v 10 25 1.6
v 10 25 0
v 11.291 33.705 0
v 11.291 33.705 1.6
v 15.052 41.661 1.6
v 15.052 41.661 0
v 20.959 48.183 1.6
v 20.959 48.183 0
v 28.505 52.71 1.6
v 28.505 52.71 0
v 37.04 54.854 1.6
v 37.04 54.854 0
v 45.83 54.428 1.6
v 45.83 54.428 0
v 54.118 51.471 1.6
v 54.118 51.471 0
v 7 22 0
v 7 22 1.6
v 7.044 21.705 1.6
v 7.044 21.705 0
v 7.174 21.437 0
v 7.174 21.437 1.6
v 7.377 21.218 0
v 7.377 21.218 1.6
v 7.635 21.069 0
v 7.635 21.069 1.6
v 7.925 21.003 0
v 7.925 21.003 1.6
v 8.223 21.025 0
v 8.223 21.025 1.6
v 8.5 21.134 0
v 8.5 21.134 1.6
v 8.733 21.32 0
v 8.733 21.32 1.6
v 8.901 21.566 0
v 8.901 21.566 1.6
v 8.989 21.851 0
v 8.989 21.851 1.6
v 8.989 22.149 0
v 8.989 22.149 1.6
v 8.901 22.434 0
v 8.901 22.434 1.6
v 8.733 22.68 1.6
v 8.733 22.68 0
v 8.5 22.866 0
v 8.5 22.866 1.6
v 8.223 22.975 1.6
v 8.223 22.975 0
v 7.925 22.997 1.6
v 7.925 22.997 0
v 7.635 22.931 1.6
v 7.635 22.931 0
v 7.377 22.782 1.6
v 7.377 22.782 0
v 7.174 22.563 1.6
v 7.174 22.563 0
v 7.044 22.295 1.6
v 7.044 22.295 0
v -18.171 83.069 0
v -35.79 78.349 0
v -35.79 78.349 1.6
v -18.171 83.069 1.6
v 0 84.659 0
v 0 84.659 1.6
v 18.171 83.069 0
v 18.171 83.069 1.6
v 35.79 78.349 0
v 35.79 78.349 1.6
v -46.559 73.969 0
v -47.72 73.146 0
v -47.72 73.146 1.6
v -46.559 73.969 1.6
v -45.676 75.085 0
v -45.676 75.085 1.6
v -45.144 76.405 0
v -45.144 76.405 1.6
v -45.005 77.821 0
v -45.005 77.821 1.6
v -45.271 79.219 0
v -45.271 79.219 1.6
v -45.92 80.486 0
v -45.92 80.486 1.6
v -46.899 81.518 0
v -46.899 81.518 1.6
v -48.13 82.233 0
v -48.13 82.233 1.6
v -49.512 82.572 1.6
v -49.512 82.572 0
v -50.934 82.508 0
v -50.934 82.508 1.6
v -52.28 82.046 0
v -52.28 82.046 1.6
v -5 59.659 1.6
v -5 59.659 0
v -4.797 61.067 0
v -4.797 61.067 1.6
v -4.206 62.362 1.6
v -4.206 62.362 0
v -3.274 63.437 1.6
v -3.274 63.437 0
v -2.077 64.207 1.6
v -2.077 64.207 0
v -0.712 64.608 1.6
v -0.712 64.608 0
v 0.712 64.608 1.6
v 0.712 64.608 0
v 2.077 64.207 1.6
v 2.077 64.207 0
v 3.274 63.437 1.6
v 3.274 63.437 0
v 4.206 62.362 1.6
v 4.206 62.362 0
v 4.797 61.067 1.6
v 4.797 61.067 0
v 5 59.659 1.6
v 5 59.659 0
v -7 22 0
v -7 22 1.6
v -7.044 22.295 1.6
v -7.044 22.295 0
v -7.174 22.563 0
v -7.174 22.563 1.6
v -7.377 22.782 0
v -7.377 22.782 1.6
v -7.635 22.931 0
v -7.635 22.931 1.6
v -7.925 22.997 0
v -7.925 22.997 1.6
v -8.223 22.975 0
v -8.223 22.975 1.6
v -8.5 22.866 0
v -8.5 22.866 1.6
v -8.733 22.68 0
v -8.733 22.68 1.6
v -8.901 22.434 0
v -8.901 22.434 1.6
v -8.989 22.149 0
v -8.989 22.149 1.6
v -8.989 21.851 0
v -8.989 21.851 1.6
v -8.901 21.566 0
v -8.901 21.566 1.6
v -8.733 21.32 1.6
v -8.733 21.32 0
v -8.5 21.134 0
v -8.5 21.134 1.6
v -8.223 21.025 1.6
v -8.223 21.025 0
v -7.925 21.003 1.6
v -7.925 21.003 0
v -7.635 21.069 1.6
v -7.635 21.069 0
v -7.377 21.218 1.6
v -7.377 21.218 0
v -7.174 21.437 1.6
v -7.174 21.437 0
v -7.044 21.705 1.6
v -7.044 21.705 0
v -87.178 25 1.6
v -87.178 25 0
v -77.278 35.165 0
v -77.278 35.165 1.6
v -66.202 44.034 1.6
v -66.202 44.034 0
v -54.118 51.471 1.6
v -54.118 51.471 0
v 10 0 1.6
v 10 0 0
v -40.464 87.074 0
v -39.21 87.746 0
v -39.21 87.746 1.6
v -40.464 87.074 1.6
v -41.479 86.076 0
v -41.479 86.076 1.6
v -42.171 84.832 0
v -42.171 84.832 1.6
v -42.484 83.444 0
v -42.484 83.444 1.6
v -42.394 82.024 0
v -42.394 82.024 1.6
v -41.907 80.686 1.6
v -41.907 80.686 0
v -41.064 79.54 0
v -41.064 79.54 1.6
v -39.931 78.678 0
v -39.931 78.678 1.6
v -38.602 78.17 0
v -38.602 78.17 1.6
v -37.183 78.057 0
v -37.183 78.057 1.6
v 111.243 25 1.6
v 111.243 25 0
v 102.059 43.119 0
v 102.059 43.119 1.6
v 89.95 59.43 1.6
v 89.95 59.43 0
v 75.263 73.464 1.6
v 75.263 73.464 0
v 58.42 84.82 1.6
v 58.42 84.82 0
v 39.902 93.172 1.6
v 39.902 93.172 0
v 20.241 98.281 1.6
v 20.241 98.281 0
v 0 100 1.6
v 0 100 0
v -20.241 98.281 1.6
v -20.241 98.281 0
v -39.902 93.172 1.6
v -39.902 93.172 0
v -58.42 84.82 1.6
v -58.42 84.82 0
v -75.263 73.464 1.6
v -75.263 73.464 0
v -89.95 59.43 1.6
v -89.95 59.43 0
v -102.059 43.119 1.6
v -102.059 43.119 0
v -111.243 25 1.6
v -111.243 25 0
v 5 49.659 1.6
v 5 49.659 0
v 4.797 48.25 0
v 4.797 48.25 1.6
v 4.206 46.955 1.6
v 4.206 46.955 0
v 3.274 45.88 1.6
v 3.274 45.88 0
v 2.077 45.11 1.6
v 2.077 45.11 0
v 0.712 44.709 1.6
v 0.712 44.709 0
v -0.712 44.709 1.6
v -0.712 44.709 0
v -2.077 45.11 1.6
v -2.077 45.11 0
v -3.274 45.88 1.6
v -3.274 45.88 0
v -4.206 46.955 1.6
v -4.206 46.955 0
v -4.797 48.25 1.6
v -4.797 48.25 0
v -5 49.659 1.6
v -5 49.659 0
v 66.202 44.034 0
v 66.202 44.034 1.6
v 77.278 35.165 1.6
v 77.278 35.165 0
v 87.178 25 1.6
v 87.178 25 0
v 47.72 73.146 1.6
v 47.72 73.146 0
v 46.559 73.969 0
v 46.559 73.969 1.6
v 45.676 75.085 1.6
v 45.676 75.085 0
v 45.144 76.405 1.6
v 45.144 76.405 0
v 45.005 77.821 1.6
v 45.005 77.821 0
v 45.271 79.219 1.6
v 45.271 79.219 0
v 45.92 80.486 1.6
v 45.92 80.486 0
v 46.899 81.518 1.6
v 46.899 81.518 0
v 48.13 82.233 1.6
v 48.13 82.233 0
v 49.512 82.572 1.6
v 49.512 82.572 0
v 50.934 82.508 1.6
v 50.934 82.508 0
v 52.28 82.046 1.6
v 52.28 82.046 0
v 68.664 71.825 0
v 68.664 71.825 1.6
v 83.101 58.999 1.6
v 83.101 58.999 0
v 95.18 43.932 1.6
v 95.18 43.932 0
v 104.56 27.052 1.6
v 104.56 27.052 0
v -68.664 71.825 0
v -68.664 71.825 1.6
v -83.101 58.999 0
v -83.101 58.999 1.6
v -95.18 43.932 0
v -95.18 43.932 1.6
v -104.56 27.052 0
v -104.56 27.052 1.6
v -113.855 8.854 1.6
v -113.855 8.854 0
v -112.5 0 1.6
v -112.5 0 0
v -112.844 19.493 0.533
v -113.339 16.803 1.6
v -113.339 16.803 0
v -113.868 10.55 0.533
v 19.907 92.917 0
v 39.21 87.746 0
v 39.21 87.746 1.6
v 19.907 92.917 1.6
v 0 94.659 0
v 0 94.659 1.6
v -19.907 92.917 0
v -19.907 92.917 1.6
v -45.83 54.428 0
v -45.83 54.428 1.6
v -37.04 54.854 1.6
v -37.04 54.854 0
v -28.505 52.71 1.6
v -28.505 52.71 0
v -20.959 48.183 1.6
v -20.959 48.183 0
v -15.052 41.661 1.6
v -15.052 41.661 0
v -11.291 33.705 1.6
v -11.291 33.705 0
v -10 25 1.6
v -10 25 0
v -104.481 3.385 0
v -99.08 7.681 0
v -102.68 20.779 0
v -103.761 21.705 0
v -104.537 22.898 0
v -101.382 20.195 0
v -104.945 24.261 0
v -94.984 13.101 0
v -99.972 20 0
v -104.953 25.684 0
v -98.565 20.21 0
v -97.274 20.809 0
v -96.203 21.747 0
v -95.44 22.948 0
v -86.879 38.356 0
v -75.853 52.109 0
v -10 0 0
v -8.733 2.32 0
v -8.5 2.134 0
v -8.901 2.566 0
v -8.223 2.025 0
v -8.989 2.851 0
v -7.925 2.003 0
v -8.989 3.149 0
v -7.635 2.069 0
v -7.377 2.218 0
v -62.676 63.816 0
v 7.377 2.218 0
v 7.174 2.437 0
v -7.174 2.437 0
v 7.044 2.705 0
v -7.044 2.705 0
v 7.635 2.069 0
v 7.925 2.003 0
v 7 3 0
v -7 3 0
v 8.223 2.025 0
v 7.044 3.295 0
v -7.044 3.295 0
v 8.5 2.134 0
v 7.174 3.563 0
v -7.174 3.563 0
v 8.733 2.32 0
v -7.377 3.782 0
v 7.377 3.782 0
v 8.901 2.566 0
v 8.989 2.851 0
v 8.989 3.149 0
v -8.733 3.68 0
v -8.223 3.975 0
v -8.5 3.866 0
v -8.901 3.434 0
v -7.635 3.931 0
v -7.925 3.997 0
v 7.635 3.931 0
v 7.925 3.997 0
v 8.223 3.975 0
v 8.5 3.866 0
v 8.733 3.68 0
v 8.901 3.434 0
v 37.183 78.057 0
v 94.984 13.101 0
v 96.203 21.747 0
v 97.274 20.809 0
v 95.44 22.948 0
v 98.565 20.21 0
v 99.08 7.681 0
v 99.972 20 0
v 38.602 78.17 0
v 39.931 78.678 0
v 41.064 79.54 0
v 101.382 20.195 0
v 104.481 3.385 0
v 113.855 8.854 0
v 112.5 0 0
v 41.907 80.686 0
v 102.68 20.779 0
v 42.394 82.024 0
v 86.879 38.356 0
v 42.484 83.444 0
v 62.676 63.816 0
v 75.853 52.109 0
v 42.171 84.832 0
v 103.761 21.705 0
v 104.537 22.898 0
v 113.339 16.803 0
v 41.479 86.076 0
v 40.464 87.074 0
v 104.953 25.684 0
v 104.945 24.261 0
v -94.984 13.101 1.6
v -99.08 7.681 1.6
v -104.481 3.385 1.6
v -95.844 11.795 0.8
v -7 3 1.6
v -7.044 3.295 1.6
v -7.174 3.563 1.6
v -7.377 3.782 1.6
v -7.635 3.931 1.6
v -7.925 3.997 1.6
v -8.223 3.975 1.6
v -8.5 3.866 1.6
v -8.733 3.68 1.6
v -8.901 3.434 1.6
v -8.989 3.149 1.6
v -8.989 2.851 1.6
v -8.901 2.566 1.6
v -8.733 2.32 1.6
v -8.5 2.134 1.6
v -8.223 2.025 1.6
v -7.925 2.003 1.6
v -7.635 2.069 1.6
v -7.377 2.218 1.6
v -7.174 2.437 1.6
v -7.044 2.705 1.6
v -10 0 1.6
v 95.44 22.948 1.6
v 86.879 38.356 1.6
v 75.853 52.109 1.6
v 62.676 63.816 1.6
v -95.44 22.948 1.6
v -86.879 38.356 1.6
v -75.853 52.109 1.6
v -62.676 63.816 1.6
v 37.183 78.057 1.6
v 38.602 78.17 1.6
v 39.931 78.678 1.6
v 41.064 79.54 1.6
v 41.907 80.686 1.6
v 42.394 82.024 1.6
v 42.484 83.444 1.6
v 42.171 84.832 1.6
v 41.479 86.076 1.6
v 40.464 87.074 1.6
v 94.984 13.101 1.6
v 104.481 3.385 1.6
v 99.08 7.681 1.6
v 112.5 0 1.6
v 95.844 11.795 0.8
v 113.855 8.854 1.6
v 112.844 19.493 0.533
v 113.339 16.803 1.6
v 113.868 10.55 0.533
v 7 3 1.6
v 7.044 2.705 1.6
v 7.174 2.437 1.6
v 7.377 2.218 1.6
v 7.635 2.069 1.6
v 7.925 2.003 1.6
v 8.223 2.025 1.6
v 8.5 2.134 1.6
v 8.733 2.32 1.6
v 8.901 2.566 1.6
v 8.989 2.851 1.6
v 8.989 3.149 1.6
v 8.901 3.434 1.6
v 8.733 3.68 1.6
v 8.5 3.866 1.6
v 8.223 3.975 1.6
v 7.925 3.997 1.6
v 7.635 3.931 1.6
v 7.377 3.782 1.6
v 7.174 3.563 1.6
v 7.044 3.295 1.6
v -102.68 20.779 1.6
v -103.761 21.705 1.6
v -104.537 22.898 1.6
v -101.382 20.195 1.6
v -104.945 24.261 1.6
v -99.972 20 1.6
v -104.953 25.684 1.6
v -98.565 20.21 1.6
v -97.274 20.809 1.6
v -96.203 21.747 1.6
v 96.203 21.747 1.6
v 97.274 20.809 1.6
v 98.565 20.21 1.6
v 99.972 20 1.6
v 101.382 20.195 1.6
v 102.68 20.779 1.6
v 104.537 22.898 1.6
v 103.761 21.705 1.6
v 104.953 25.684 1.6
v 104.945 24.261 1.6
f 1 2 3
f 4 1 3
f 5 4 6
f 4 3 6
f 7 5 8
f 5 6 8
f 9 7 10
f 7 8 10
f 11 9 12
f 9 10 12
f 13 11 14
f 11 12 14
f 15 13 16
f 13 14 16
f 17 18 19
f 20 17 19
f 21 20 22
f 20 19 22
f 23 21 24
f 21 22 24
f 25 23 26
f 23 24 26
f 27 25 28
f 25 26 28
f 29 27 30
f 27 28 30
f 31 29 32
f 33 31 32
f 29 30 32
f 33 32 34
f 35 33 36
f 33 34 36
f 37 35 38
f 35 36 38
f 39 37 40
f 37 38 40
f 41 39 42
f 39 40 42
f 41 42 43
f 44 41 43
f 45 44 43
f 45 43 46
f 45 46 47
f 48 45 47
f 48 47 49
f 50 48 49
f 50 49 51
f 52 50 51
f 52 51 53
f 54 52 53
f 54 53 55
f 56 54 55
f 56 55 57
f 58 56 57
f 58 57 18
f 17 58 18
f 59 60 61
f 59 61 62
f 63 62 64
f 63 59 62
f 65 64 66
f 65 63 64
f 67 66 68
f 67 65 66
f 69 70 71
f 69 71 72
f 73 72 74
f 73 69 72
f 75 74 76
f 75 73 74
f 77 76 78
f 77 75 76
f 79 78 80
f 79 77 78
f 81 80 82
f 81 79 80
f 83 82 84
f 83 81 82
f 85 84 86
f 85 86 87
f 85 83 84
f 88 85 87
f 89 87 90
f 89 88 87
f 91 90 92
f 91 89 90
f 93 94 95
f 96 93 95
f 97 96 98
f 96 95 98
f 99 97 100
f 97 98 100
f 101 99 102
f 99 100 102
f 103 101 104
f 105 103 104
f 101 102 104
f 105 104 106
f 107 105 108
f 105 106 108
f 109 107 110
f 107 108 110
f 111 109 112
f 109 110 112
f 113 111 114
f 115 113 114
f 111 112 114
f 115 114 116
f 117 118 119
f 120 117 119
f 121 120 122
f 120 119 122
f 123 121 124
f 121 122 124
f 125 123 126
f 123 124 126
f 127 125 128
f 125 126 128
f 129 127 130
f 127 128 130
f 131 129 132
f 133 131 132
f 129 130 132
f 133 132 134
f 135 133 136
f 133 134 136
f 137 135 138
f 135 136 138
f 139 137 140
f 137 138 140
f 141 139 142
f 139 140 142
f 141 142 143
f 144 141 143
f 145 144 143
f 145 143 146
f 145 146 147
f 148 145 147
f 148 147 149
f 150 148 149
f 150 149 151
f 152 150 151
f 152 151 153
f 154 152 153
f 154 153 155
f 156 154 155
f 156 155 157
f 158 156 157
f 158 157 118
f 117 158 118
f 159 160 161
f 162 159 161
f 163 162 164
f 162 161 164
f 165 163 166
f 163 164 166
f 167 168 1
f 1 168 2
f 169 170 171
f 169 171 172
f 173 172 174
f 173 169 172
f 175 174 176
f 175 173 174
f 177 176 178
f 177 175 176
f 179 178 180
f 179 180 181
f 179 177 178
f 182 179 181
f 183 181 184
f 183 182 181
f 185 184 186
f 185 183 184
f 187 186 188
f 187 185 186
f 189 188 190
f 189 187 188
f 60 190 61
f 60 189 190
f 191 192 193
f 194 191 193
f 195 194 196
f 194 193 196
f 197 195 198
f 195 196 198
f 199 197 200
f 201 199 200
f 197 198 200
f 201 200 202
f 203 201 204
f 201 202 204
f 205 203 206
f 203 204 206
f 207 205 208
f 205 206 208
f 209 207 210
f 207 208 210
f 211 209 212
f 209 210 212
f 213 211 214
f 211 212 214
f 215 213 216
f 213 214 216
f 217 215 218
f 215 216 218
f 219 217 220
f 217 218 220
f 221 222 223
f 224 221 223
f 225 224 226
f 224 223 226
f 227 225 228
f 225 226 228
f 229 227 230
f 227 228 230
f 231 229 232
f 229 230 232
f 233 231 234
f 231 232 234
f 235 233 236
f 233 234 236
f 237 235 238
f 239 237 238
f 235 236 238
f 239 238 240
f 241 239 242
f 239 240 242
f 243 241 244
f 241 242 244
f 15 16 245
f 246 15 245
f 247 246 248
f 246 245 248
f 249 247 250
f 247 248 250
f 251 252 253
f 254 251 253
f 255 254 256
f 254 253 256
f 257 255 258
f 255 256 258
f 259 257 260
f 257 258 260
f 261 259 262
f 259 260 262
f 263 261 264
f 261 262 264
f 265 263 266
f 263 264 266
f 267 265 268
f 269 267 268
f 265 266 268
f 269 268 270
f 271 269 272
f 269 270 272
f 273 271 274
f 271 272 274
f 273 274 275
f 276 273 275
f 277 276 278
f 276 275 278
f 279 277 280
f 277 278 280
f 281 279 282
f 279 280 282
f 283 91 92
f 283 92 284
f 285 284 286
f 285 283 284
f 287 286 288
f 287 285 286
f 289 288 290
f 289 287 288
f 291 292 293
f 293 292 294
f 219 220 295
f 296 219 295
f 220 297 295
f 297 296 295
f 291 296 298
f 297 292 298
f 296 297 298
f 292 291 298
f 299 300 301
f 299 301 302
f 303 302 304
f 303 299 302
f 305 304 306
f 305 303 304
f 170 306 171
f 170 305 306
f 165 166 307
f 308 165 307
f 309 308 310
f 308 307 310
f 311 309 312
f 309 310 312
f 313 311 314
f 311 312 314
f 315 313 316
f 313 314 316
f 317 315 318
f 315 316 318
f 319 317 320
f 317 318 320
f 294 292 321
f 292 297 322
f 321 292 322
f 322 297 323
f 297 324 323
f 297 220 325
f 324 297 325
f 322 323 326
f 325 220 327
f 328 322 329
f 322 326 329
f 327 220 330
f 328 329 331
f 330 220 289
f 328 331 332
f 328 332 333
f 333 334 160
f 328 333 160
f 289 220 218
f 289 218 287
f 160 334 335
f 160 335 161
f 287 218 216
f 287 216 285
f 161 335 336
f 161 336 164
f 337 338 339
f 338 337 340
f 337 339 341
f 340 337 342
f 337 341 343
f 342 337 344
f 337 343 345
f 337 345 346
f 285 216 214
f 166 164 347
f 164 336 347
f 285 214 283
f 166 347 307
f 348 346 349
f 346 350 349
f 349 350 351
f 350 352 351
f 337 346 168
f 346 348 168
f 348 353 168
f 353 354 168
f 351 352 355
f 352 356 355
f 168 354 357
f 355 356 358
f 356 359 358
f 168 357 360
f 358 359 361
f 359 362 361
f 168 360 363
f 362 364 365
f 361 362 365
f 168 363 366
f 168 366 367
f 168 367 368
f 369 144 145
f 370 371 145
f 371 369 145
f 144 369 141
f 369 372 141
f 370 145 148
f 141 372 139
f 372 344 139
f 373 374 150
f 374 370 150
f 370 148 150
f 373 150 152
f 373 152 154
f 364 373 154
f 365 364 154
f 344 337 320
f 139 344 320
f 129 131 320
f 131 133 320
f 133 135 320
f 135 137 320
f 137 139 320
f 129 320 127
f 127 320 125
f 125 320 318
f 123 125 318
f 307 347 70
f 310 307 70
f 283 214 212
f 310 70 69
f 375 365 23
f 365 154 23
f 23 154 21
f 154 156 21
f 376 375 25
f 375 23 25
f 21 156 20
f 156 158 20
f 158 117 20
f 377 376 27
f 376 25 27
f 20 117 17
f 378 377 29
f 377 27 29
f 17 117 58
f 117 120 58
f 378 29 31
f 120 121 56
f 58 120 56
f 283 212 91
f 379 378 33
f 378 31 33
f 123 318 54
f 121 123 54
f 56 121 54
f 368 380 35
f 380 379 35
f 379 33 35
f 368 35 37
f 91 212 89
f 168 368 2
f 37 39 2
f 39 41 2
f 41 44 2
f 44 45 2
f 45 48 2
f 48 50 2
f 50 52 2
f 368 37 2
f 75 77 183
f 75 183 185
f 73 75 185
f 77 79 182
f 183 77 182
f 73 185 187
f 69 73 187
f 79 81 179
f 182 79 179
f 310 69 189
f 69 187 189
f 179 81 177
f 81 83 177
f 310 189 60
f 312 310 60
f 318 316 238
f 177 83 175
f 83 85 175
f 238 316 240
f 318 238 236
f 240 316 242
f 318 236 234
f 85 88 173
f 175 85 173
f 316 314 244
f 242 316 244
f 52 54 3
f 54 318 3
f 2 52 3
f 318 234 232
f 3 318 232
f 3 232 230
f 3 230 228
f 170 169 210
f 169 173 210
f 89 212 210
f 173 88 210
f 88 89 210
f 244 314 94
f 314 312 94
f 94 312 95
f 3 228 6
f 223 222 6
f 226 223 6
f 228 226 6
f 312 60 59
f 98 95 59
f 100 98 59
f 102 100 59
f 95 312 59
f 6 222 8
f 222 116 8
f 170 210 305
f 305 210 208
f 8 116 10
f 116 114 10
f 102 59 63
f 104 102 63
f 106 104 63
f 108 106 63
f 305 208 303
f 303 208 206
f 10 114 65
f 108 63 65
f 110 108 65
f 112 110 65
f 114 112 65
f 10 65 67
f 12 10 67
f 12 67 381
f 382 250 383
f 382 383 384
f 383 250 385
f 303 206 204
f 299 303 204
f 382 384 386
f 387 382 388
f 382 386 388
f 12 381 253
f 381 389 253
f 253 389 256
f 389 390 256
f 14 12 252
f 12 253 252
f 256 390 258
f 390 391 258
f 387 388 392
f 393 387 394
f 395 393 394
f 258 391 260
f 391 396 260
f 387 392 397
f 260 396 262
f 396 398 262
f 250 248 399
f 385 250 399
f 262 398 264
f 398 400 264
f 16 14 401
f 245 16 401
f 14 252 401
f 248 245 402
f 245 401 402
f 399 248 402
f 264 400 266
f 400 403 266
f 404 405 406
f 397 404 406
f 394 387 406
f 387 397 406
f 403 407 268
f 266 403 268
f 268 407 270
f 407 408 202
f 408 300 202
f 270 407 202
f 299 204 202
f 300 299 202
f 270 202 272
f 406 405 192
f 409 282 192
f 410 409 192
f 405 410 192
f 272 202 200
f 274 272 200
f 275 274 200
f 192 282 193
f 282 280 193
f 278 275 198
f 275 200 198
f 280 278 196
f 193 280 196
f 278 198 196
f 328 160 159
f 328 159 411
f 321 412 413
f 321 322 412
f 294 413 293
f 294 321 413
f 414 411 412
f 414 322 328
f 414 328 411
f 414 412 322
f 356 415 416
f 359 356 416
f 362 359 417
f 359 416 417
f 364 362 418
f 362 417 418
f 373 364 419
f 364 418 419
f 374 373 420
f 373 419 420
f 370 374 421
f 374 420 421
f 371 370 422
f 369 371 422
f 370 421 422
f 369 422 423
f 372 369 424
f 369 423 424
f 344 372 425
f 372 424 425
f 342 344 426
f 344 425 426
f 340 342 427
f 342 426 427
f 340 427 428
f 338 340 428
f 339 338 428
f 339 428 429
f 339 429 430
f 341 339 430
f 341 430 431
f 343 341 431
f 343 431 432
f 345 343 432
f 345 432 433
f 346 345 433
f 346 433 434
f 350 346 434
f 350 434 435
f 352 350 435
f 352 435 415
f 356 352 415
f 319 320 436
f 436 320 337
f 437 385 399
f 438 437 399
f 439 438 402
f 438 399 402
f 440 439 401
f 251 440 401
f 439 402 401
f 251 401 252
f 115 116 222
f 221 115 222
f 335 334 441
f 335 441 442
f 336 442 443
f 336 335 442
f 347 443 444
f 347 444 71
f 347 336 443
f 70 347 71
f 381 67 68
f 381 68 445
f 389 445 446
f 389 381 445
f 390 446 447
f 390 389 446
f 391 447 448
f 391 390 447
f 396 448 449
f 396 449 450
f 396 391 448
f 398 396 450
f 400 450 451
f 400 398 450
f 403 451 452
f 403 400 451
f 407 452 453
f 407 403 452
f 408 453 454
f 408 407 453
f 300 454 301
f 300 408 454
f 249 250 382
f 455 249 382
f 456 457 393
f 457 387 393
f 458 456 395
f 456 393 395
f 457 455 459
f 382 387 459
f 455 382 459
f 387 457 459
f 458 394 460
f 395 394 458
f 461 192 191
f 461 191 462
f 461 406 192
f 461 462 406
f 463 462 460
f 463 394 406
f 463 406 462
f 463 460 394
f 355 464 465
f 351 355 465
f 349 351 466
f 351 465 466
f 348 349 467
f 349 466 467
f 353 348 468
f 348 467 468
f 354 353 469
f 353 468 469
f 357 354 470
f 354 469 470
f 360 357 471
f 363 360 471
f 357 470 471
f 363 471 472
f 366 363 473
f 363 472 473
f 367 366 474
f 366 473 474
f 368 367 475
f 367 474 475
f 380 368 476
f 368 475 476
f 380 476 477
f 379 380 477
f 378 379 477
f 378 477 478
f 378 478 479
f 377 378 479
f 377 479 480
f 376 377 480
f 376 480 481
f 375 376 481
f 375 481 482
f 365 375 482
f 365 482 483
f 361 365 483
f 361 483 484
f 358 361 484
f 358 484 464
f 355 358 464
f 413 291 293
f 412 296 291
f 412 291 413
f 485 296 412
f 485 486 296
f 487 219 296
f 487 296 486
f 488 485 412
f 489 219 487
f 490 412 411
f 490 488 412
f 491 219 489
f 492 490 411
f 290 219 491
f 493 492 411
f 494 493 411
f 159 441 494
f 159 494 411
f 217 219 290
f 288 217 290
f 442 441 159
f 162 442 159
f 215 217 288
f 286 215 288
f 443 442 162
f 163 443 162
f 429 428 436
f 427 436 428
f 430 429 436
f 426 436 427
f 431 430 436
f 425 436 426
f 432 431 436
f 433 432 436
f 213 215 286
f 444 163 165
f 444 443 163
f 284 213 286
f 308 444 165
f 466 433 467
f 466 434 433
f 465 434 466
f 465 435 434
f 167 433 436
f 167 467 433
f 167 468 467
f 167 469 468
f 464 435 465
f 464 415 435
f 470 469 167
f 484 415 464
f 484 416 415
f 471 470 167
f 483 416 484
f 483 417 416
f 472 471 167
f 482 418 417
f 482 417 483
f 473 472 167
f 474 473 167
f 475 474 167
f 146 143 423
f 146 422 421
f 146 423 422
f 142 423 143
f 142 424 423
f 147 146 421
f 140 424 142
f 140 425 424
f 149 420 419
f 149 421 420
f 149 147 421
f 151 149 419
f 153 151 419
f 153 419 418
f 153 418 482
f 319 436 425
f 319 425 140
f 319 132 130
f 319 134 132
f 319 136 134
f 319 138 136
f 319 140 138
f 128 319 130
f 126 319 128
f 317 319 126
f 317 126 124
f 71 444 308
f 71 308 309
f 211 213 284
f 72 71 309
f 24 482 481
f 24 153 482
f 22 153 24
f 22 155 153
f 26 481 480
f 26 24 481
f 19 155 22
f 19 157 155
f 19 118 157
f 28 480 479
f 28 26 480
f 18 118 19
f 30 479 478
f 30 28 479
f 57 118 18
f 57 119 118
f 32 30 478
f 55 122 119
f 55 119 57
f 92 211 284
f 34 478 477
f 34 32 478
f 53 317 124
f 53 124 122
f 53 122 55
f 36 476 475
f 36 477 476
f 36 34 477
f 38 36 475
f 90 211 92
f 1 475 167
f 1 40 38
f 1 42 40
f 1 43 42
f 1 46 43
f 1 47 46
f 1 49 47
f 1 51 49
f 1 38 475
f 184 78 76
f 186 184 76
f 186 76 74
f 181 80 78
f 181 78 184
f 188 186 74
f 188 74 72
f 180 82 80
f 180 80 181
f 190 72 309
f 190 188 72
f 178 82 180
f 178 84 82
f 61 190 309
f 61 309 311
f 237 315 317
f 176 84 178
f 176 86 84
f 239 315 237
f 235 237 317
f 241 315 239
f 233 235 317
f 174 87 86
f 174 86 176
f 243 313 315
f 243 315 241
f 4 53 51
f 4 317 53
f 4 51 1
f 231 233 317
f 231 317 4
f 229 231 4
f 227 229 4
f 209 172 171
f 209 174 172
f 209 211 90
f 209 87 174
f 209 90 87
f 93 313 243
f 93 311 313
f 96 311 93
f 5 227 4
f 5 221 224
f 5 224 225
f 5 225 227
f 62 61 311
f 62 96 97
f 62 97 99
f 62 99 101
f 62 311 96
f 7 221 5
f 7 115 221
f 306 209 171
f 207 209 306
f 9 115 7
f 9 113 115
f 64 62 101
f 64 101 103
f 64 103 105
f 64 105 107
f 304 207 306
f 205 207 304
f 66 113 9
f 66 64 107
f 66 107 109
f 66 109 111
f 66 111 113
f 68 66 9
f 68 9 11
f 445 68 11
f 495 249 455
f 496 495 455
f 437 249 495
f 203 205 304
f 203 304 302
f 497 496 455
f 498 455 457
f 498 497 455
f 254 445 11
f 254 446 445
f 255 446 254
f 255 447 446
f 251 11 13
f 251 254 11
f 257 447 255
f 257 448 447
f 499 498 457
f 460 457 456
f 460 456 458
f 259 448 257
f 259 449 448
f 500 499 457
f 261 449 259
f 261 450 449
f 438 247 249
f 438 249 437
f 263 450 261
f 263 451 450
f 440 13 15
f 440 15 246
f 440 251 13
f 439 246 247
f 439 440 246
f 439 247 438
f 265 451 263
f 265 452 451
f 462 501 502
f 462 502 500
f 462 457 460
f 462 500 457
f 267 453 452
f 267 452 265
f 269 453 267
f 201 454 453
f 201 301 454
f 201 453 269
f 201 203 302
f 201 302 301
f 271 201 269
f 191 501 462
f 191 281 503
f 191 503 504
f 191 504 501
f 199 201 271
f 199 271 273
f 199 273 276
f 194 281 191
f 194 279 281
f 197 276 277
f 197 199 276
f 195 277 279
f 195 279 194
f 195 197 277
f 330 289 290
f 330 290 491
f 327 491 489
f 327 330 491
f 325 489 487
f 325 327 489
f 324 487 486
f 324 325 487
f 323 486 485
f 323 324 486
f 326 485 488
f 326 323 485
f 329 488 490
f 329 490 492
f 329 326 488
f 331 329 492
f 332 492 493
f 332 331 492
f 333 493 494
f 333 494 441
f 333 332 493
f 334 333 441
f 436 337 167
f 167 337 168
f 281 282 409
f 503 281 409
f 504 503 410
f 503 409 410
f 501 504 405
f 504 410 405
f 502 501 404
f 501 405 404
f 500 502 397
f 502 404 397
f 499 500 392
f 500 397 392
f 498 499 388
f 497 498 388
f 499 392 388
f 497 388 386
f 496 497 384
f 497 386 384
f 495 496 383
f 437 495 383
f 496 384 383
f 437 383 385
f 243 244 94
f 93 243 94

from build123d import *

# Parameters (mm, degrees)
EXTRUDE_2_DEPTH     = 1.6
SKETCH_2_R          = 1
CUT_EXTRUDE_1_DEPTH = 152.556112047


with BuildPart() as part:
    # 草图1 → 凸台-拉伸2 (new body)
    with BuildSketch(Plane.XY):
        with BuildLine():
            Line((-10, 0), (10, 0))
            Line((10, 0), (10, 25))
            ThreePointArc((10, 25), (24.565127337, 50.724787771), (54.117647059, 51.470588235))
            ThreePointArc((54.117647059, 51.470588235), (71.876884233, 39.7703376), (87.177978871, 25))
            add(Edge.make_bspline(
                [(87.177978871, 25), (90.304994573, 21.365241216), (96.247853251, 9.443363931), (103.450341903, 2.775811449), (112.5, 0)],
                knots=[0, 0, 0, 0, 0.44500112, 1, 1, 1, 1], degree=3))
            add(Edge.make_bspline(
                [(111.242977306, 25), (112.528770299, 21.821434652), (115.6681563, 10.742987267), (112.5, 0)],
                knots=[0, 0, 0, 0, 1, 1, 1, 1], degree=3))
            ThreePointArc((111.242977306, 25), (0, 100), (-111.242977306, 25))
            add(Edge.make_bspline(
                [(-111.242977306, 25), (-112.528770299, 21.821434652), (-115.6681563, 10.742987267), (-112.5, 0)],
                knots=[0, 0, 0, 0, 1, 1, 1, 1], degree=3))
            add(Edge.make_bspline(
                [(-87.177978871, 25), (-90.304994573, 21.365241216), (-96.247853251, 9.443363931), (-103.450341903, 2.775811449), (-112.5, 0)],
                knots=[0, 0, 0, 0, 0.44500112, 1, 1, 1, 1], degree=3))
            ThreePointArc((-87.177978871, 25), (-71.876884233, 39.7703376), (-54.117647059, 51.470588235))
            ThreePointArc((-54.117647059, 51.470588235), (-24.565127337, 50.724787771), (-10, 25))
            Line((-10, 25), (-10, 0))
        make_face()
        with BuildLine():
            Line((5, 59.658560997), (5, 49.658560997))
            ThreePointArc((5, 49.658560997), (0, 44.658560997), (-5, 49.658560997))
            Line((-5, 49.658560997), (-5, 59.658560997))
            ThreePointArc((-5, 59.658560997), (0, 64.658560997), (5, 59.658560997))
        make_face(mode=Mode.SUBTRACT)
        with BuildLine():
            ThreePointArc((-52.279803763, 82.046105896), (-83.1008003, 58.999003788), (-104.559607526, 27.051823387))
            ThreePointArc((-104.559607526, 27.051823387), (-102.051823387, 20.440392474), (-95.440392474, 22.948176613))
            ThreePointArc((-95.440392474, 22.948176613), (-75.853125153, 52.10906874), (-47.720196237, 73.146107064))
            ThreePointArc((-47.720196237, 73.146107064), (-45.550000584, 79.875910243), (-52.279803763, 82.046105896))
        make_face(mode=Mode.SUBTRACT)
        with BuildLine():
            ThreePointArc((52.279803763, 82.046105896), (83.1008003, 58.999003788), (104.559607526, 27.051823387))
            ThreePointArc((104.559607526, 27.051823387), (102.051823387, 20.440392474), (95.440392474, 22.948176613))
            ThreePointArc((95.440392474, 22.948176613), (75.853125153, 52.10906874), (47.720196237, 73.146107064))
            ThreePointArc((47.720196237, 73.146107064), (45.550000584, 79.875910243), (52.279803763, 82.046105896))
        make_face(mode=Mode.SUBTRACT)
        with BuildLine():
            ThreePointArc((39.209852822, 87.74587255), (0, 94.658560997), (-39.209852822, 87.74587255))
            ThreePointArc((-39.209852822, 87.74587255), (-42.198553323, 81.337466405), (-35.790147178, 78.348765905))
            ThreePointArc((-35.790147178, 78.348765905), (0, 84.658560997), (35.790147178, 78.348765905))
            ThreePointArc((35.790147178, 78.348765905), (42.198553323, 81.337466405), (39.209852822, 87.74587255))
        make_face(mode=Mode.SUBTRACT)
    extrude(amount=EXTRUDE_2_DEPTH)

    # 草图2 → 切除-拉伸1 (cut, through all)
    with BuildSketch(Plane.XY.offset(1.6)):
        with Locations((-8, 3)):
            Circle(SKETCH_2_R)
        with Locations(Location((8, 3, 0), (0, 0, 180))):
            Circle(SKETCH_2_R)
        with Locations((-8, 22)):
            Circle(SKETCH_2_R)
        with Locations(Location((8, 22, 0), (0, 0, 180))):
            Circle(SKETCH_2_R)
    extrude(amount=-CUT_EXTRUDE_1_DEPTH, mode=Mode.SUBTRACT)


solid = part.part
